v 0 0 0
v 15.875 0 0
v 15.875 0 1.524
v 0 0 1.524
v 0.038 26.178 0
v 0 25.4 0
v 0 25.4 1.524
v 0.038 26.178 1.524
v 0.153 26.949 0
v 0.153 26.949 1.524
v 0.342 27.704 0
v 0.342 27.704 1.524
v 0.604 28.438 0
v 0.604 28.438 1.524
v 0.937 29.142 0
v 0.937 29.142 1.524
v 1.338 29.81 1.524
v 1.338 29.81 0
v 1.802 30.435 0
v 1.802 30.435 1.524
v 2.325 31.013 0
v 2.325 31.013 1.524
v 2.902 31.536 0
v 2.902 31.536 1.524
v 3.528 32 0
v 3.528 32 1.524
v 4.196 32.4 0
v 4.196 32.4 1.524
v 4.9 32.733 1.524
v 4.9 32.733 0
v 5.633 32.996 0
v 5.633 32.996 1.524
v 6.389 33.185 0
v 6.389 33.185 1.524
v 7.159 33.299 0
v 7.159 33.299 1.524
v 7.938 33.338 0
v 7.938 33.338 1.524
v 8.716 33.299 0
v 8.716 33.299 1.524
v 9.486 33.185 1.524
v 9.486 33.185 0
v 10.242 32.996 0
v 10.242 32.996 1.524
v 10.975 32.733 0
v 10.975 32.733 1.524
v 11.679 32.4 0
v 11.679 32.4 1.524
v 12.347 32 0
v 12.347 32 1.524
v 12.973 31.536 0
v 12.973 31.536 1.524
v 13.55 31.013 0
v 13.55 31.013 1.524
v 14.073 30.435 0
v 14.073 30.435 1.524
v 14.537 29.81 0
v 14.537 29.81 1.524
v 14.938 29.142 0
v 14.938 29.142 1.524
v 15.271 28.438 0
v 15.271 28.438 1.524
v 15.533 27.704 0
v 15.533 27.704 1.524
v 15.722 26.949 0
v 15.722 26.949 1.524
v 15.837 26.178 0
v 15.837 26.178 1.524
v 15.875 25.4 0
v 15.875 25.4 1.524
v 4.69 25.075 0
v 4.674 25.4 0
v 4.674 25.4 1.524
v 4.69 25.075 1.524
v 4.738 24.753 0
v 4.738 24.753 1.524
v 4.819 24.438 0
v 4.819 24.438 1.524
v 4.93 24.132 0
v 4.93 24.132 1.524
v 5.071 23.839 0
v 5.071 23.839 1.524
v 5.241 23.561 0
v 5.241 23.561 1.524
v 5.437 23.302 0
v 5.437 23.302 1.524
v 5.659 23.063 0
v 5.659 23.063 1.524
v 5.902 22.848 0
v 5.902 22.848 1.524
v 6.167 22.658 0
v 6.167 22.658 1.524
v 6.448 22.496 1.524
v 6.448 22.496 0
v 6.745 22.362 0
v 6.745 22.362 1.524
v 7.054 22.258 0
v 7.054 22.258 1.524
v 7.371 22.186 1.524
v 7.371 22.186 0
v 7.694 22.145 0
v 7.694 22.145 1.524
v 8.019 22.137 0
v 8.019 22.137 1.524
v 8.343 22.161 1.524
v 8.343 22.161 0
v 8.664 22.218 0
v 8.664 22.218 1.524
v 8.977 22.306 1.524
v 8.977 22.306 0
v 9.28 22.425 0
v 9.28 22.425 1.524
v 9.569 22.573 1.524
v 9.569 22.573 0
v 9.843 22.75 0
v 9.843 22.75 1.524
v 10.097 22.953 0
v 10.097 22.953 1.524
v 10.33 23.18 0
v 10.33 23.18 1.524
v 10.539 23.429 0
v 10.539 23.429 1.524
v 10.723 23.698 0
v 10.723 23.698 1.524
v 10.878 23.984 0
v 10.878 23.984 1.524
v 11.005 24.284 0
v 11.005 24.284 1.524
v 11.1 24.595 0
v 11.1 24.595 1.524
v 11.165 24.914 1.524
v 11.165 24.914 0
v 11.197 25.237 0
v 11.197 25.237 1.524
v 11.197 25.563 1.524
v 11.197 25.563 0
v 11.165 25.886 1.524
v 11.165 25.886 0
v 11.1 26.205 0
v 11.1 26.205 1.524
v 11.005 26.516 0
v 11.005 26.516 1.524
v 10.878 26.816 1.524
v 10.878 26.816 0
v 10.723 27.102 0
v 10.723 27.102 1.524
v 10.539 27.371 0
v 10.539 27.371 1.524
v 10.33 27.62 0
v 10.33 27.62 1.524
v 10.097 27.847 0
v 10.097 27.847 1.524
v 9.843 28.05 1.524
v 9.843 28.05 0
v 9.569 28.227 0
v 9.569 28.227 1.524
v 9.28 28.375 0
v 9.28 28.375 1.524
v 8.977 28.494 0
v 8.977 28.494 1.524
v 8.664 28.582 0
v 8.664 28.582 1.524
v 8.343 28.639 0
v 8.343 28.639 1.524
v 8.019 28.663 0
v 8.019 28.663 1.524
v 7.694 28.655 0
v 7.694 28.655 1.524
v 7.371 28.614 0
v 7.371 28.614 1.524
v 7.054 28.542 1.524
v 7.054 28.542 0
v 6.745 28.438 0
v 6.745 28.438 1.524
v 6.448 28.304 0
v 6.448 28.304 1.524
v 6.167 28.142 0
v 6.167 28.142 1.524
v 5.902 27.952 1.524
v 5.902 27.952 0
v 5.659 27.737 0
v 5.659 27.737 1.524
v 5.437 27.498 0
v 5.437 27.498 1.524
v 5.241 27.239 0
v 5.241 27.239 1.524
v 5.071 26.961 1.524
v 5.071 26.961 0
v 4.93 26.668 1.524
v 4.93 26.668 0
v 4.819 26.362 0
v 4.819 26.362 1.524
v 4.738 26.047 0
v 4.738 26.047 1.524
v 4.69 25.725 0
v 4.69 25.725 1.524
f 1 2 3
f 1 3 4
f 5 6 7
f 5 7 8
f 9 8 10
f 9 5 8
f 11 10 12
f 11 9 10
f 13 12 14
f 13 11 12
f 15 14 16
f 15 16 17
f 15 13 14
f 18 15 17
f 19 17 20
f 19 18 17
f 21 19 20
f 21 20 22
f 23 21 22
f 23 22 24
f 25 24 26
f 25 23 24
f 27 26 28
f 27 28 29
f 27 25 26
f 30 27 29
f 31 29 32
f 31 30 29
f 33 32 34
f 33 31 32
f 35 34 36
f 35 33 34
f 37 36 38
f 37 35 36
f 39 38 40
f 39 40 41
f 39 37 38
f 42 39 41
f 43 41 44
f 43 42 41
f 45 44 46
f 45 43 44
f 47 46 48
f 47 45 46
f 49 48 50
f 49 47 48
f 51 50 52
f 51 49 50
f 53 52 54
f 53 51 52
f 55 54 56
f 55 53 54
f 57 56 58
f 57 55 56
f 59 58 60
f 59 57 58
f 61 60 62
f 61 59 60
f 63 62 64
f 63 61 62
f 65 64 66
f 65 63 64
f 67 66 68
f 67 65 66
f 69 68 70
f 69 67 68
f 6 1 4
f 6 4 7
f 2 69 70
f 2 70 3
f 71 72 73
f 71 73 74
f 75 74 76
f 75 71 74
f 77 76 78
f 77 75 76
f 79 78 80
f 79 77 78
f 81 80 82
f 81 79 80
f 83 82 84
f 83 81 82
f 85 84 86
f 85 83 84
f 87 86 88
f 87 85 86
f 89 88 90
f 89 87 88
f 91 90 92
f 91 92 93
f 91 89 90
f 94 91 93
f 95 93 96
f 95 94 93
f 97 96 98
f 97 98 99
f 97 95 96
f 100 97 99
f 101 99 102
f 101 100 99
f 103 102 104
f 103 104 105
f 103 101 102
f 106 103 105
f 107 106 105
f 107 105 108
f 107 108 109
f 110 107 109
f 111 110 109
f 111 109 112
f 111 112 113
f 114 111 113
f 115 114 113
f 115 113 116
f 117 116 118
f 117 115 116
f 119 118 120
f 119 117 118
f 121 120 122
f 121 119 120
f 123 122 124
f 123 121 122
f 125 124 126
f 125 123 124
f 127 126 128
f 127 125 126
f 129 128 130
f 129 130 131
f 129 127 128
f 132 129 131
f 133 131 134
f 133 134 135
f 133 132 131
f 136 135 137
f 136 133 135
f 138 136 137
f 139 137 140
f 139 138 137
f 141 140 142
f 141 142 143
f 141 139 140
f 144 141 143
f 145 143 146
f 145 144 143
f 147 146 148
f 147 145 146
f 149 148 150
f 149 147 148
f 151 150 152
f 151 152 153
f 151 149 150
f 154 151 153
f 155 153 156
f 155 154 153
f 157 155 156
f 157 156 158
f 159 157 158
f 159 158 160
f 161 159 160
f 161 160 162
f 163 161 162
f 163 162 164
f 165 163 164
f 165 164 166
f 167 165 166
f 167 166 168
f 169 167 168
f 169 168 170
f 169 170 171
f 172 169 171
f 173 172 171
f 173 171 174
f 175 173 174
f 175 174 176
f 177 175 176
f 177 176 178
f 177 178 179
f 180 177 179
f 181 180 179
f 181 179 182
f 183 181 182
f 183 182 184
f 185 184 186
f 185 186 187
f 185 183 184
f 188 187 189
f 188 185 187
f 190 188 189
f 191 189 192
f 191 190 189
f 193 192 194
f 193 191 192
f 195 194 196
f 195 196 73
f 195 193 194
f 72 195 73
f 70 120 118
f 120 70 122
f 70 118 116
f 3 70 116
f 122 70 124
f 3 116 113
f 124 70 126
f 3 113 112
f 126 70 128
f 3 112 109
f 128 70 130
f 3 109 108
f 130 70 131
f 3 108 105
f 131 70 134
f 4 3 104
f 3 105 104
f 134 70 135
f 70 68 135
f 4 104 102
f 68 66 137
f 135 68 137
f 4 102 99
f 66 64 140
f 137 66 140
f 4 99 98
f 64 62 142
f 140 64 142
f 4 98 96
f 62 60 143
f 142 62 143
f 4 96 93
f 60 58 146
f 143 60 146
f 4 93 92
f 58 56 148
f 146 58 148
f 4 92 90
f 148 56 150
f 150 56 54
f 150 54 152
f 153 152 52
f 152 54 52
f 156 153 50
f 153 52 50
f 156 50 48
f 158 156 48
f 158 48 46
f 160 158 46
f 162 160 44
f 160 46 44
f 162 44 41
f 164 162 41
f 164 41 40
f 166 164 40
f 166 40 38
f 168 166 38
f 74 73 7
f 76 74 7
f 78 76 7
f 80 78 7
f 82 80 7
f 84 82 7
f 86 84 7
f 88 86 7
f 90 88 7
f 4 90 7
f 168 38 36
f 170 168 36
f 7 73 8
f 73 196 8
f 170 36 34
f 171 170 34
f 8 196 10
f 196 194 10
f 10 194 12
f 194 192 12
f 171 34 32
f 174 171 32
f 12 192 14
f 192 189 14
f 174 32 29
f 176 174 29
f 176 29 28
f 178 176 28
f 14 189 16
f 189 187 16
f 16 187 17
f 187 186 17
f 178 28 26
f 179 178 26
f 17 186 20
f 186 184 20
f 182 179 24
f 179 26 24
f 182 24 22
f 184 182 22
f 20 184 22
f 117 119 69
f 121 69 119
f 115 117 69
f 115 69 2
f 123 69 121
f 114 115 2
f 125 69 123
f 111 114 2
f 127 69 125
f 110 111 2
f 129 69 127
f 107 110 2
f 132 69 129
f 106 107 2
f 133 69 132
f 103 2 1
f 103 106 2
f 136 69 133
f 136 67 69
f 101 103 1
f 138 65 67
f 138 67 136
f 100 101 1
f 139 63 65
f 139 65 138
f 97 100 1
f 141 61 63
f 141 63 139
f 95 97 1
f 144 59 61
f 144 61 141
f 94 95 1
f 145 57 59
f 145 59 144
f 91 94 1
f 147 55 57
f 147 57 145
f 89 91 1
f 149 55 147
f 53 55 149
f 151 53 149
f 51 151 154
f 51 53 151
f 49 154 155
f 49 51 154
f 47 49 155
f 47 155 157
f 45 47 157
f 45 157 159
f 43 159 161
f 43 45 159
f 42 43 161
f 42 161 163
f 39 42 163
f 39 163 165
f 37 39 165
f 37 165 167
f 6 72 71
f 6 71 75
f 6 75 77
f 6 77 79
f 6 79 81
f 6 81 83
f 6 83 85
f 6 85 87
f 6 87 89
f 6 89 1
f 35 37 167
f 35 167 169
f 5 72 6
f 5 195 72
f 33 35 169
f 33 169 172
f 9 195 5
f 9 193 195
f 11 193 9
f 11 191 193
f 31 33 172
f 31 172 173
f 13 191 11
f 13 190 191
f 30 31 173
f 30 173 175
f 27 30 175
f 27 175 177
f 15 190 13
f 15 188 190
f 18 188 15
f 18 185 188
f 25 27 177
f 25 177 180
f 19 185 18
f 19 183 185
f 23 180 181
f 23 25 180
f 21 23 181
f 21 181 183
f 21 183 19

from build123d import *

# Parameters (mm, degrees)
SKETCH1_R           = 3.2639
BOSS_EXTRUDE1_DEPTH = 1.524


with BuildPart() as part:
    # Sketch1 → Boss-Extrude1 (new body)
    with BuildSketch(Plane.XY):
        with BuildLine():
            Line((0, 0), (0, 25.4))
            ThreePointArc((0, 25.4), (7.9375, 33.3375), (15.875, 25.4))
            Line((15.875, 25.4), (15.875, 0))
            Line((15.875, 0), (0, 0))
        make_face()
        with Locations(Location((7.9375, 25.4, 0), (0, 0, 180))):
            Circle(SKETCH1_R, mode=Mode.SUBTRACT)
    extrude(amount=BOSS_EXTRUDE1_DEPTH)


solid = part.part
